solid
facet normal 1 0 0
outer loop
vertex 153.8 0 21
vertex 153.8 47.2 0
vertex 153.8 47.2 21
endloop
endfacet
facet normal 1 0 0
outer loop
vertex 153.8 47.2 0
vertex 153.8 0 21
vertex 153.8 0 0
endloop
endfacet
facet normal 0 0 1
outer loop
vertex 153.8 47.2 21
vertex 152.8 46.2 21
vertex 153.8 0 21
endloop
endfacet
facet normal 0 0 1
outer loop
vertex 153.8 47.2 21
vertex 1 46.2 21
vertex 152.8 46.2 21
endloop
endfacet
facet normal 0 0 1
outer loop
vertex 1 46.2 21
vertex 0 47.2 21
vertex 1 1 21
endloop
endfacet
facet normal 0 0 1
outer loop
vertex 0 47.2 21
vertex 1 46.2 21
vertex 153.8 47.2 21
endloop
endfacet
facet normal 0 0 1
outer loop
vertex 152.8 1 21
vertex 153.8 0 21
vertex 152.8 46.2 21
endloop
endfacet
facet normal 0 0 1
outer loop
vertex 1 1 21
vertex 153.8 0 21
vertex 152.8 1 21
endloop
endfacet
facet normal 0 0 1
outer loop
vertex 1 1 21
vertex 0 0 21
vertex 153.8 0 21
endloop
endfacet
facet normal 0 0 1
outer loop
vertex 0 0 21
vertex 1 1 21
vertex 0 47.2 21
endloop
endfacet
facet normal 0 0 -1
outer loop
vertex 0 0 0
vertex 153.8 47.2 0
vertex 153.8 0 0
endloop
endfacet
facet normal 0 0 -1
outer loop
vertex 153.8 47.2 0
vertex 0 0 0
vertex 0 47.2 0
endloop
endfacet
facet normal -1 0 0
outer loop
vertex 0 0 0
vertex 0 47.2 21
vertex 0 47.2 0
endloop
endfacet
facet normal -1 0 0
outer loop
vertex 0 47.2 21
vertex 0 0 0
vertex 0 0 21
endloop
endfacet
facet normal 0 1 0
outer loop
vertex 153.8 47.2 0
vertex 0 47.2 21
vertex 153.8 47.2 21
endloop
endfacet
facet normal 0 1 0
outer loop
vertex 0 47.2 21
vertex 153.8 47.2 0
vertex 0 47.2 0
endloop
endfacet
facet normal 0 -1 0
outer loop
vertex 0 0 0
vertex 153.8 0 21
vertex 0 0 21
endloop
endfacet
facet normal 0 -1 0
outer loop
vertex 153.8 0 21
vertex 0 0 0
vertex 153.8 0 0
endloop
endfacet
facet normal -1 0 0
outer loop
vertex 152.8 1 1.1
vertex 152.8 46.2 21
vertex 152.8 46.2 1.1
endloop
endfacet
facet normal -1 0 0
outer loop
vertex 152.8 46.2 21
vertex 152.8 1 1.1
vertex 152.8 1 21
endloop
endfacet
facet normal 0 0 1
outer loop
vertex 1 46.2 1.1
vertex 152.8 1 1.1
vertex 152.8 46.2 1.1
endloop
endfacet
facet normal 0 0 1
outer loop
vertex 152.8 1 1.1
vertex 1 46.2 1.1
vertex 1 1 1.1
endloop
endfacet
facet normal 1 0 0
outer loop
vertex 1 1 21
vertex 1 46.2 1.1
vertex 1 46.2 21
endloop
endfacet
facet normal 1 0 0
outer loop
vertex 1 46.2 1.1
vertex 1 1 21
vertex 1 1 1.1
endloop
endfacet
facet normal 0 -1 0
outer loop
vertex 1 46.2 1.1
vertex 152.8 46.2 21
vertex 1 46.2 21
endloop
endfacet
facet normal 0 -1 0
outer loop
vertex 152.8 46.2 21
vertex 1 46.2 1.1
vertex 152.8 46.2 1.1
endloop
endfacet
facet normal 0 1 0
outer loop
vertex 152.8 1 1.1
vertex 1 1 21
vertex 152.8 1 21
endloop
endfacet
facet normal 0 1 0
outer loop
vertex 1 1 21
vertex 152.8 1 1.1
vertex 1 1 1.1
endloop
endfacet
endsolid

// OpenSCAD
/* [Basic Settings] */
//Number of Tiles for this section
number_of_tiles=72;
//Enable Tile Divider(true=1,false=0)
Divider=0;//[0,1]
//Enable Meeple Compartment(true=1,false=0)
Meeple=0;//[0,1]

/* [Thickness/Tolerance settings] */
//Adjust tile width to printer tolerance or looser fit. 45.2 fits snugly for me
tile_width=45.2;
//Thicker walls use more filament and print time but makes it stronger
wall_width=1.0;
//Modify it if you have a different average thickness of tiles
tile_thickness=2.1;
//Adds excess space for easier removal of tiles and to compensate for printer tolerance
tile_excess_space=0.6;

/* [Customisation] */
//Height of the box
height=20;

/* [Divider] */
//Number of dividers, CHANGE ONLY IF YOU ARE USING IT[Currently supporting up to 5 per row]
no_of_divider=0;//[5]
//Width of the divider
divider_width=1;//in mm
//Divider 1 location(as an integer in terms of tiles)
div1=0;
//Divider 2 location(as an integer in terms of tiles)
div2=0;
//Divider 3 location(as an integer in terms of tiles)
div3=0;
//Divider 4 location(as an integer in terms of tiles)
div4=0;
//Divider 5 location(as an integer in terms of tiles)
div5=0;

/* [Meeple Compartment] */
//Number of meeple compartments
mcom=0;
//Position of first meeple compartment 
mpos=0;//(as an integer in terms of tiles)
//Spacing of meeple compartments ( 22 is used in my other project but you might want to use a wider value)
mspace=22;//in mm
//Height of meeple compartments
mheight=40;//in mm
//Width of meeple compartments
mwidth=1;//in mm
//Resolution of circle
$fn=200;
//Ciurcular cutout
circle_radius =10;//in mm

/**
CODE
**/

//generate box
difference(){
    
    cube([number_of_tiles*tile_thickness+tile_excess_space+no_of_divider*divider_width+wall_width*2,tile_width+wall_width*2 ,height+wall_width]);

    translate([wall_width,wall_width,wall_width+0.1]){  
   cube([number_of_tiles*tile_thickness+tile_excess_space+no_of_divider*divider_width,tile_width,height]);
  }

}

//generate divider
if(Divider==1&&no_of_divider>0&&no_of_divider<6){
translate([div1*tile_thickness+tile_excess_space,wall_width,wall_width])
cube([divider_width,tile_width,height]);
     if(no_of_divider>1){
translate([div2*tile_thickness+tile_excess_space,wall_width,wall_width])
cube([divider_width,tile_width,height]);
     }
     if(no_of_divider>2){
translate([div3*tile_thickness+tile_excess_space,wall_width,wall_width])
cube([divider_width,tile_width,height]);
     }
     if(no_of_divider>3){
translate([div4*tile_thickness+tile_excess_space,wall_width,wall_width])
cube([divider_width,tile_width,height]);
     }
     if(no_of_divider>4){
translate([div5*tile_thickness+tile_excess_space,wall_width,wall_width])
cube([divider_width,tile_width,height]);
     }
}

//generate Meeple Compartment
if(Meeple==1&&mcom>0){
    for(i=[0:1:mcom]){
    translate([i*mspace,0,0]){
    difference(){
        translate([mpos*tile_thickness,wall_width,0])
        cube([mwidth,tile_width+wall_width,mheight]);
        
        translate([-1,(tile_width+wall_width*2)/2,mheight])
        rotate([0,90,0]){
        cylinder(h=mwidth*5,r=circle_radius);
        };
    }
    }
    }
    translate([mpos*tile_thickness,0,0])
    cube([mcom*mspace+mwidth,wall_width,mheight]);
        
    for(i=[0:1:1]){
    translate([mpos*tile_thickness,wall_width+tile_width,0]){
    cube([mcom*mspace+mwidth,wall_width,mheight]);
    }
}
}
